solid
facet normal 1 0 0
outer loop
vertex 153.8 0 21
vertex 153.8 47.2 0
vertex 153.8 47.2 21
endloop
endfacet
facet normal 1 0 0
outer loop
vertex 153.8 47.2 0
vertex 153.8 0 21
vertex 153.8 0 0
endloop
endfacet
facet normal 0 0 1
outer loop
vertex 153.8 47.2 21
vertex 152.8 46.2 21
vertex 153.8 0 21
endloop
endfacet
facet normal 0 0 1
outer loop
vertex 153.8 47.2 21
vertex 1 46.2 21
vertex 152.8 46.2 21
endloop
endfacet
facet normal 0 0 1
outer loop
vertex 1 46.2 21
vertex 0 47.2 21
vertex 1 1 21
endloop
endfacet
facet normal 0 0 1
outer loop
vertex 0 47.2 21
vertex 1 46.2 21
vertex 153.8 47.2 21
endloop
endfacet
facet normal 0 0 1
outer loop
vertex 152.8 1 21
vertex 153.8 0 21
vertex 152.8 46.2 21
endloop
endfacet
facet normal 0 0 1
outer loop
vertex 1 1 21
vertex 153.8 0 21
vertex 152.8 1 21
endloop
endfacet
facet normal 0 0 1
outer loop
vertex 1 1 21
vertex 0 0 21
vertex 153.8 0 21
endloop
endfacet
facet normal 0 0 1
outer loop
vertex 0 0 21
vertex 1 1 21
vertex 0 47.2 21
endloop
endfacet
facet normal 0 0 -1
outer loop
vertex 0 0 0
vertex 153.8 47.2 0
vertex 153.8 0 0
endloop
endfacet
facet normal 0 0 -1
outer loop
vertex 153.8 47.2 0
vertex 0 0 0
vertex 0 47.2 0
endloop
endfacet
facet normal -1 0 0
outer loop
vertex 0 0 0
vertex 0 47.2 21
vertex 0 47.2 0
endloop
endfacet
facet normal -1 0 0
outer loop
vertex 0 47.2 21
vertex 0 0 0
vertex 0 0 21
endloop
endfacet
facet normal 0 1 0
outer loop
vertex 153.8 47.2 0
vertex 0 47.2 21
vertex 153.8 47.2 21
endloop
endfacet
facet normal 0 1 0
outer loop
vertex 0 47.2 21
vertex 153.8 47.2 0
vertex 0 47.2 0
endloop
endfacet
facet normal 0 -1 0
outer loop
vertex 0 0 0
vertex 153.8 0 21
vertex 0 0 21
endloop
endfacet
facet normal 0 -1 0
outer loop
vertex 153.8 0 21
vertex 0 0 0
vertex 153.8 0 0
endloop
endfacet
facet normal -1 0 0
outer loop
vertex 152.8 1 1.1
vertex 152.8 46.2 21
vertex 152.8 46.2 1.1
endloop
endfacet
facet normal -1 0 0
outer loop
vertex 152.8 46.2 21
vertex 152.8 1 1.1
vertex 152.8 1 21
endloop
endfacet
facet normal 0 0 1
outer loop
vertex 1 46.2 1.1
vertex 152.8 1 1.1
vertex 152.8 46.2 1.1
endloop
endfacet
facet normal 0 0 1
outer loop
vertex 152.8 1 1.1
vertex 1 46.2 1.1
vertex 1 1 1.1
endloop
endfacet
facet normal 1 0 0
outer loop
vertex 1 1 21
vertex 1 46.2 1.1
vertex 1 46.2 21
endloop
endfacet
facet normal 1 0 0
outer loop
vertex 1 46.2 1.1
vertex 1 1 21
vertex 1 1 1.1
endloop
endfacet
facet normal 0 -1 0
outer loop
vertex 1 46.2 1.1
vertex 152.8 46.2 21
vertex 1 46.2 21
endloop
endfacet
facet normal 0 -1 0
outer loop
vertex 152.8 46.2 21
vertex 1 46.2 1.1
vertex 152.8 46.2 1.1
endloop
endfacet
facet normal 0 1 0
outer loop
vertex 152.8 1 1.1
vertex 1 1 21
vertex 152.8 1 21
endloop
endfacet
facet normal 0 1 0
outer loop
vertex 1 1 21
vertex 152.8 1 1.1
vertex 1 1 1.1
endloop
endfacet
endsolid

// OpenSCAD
/* [Basic Settings] */
//Number of Tiles for this section
number_of_tiles=72;
//Enable Tile Divider(true=1,false=0)
Divider=0;//[0,1]
//Enable Meeple Compartment(true=1,false=0)
Meeple=0;//[0,1]

/* [Thickness/Tolerance settings] */
//Adjust tile width to printer tolerance or looser fit. 45.2 fits snugly for me
tile_width=45.2;
//Thicker walls use more filament and print time but makes it stronger
wall_width=1.0;
//Modify it if you have a different average thickness of tiles
tile_thickness=2.1;
//Adds excess space for easier removal of tiles and to compensate for printer tolerance
tile_excess_space=0.6;

/* [Customisation] */
//Height of the box
height=20;

/* [Divider] */
//Number of dividers, CHANGE ONLY IF YOU ARE USING IT[Currently supporting up to 5 per row]
no_of_divider=0;//[5]
//Width of the divider
divider_width=1;//in mm
//Divider 1 location(as an integer in terms of tiles)
div1=0;
//Divider 2 location(as an integer in terms of tiles)
div2=0;
//Divider 3 location(as an integer in terms of tiles)
div3=0;
//Divider 4 location(as an integer in terms of tiles)
div4=0;
//Divider 5 location(as an integer in terms of tiles)
div5=0;

/* [Meeple Compartment] */
//Number of meeple compartments
mcom=0;
//Position of first meeple compartment 
mpos=0;//(as an integer in terms of tiles)
//Spacing of meeple compartments ( 22 is used in my other project but you might want to use a wider value)
mspace=22;//in mm
//Height of meeple compartments
mheight=40;//in mm
//Width of meeple compartments
mwidth=1;//in mm
//Resolution of circle
$fn=200;
//Ciurcular cutout
circle_radius =10;//in mm

/**
CODE
**/

//generate box
difference(){
    
    cube([number_of_tiles*tile_thickness+tile_excess_space+no_of_divider*divider_width+wall_width*2,tile_width+wall_width*2 ,height+wall_width]);

    translate([wall_width,wall_width,wall_width+0.1]){  
   cube([number_of_tiles*tile_thickness+tile_excess_space+no_of_divider*divider_width,tile_width,height]);
  }

}

//generate divider
if(Divider==1&&no_of_divider>0&&no_of_divider<6){
translate([div1*tile_thickness+tile_excess_space,wall_width,wall_width])
cube([divider_width,tile_width,height]);
     if(no_of_divider>1){
translate([div2*tile_thickness+tile_excess_space,wall_width,wall_width])
cube([divider_width,tile_width,height]);
     }
     if(no_of_divider>2){
translate([div3*tile_thickness+tile_excess_space,wall_width,wall_width])
cube([divider_width,tile_width,height]);
     }
     if(no_of_divider>3){
translate([div4*tile_thickness+tile_excess_space,wall_width,wall_width])
cube([divider_width,tile_width,height]);
     }
     if(no_of_divider>4){
translate([div5*tile_thickness+tile_excess_space,wall_width,wall_width])
cube([divider_width,tile_width,height]);
     }
}

//generate Meeple Compartment
if(Meeple==1&&mcom>0){
    for(i=[0:1:mcom]){
    translate([i*mspace,0,0]){
    difference(){
        translate([mpos*tile_thickness,wall_width,0])
        cube([mwidth,tile_width+wall_width,mheight]);
        
        translate([-1,(tile_width+wall_width*2)/2,mheight])
        rotate([0,90,0]){
        cylinder(h=mwidth*5,r=circle_radius);
        };
    }
    }
    }
    translate([mpos*tile_thickness,0,0])
    cube([mcom*mspace+mwidth,wall_width,mheight]);
        
    for(i=[0:1:1]){
    translate([mpos*tile_thickness,wall_width+tile_width,0]){
    cube([mcom*mspace+mwidth,wall_width,mheight]);
    }
}
}
